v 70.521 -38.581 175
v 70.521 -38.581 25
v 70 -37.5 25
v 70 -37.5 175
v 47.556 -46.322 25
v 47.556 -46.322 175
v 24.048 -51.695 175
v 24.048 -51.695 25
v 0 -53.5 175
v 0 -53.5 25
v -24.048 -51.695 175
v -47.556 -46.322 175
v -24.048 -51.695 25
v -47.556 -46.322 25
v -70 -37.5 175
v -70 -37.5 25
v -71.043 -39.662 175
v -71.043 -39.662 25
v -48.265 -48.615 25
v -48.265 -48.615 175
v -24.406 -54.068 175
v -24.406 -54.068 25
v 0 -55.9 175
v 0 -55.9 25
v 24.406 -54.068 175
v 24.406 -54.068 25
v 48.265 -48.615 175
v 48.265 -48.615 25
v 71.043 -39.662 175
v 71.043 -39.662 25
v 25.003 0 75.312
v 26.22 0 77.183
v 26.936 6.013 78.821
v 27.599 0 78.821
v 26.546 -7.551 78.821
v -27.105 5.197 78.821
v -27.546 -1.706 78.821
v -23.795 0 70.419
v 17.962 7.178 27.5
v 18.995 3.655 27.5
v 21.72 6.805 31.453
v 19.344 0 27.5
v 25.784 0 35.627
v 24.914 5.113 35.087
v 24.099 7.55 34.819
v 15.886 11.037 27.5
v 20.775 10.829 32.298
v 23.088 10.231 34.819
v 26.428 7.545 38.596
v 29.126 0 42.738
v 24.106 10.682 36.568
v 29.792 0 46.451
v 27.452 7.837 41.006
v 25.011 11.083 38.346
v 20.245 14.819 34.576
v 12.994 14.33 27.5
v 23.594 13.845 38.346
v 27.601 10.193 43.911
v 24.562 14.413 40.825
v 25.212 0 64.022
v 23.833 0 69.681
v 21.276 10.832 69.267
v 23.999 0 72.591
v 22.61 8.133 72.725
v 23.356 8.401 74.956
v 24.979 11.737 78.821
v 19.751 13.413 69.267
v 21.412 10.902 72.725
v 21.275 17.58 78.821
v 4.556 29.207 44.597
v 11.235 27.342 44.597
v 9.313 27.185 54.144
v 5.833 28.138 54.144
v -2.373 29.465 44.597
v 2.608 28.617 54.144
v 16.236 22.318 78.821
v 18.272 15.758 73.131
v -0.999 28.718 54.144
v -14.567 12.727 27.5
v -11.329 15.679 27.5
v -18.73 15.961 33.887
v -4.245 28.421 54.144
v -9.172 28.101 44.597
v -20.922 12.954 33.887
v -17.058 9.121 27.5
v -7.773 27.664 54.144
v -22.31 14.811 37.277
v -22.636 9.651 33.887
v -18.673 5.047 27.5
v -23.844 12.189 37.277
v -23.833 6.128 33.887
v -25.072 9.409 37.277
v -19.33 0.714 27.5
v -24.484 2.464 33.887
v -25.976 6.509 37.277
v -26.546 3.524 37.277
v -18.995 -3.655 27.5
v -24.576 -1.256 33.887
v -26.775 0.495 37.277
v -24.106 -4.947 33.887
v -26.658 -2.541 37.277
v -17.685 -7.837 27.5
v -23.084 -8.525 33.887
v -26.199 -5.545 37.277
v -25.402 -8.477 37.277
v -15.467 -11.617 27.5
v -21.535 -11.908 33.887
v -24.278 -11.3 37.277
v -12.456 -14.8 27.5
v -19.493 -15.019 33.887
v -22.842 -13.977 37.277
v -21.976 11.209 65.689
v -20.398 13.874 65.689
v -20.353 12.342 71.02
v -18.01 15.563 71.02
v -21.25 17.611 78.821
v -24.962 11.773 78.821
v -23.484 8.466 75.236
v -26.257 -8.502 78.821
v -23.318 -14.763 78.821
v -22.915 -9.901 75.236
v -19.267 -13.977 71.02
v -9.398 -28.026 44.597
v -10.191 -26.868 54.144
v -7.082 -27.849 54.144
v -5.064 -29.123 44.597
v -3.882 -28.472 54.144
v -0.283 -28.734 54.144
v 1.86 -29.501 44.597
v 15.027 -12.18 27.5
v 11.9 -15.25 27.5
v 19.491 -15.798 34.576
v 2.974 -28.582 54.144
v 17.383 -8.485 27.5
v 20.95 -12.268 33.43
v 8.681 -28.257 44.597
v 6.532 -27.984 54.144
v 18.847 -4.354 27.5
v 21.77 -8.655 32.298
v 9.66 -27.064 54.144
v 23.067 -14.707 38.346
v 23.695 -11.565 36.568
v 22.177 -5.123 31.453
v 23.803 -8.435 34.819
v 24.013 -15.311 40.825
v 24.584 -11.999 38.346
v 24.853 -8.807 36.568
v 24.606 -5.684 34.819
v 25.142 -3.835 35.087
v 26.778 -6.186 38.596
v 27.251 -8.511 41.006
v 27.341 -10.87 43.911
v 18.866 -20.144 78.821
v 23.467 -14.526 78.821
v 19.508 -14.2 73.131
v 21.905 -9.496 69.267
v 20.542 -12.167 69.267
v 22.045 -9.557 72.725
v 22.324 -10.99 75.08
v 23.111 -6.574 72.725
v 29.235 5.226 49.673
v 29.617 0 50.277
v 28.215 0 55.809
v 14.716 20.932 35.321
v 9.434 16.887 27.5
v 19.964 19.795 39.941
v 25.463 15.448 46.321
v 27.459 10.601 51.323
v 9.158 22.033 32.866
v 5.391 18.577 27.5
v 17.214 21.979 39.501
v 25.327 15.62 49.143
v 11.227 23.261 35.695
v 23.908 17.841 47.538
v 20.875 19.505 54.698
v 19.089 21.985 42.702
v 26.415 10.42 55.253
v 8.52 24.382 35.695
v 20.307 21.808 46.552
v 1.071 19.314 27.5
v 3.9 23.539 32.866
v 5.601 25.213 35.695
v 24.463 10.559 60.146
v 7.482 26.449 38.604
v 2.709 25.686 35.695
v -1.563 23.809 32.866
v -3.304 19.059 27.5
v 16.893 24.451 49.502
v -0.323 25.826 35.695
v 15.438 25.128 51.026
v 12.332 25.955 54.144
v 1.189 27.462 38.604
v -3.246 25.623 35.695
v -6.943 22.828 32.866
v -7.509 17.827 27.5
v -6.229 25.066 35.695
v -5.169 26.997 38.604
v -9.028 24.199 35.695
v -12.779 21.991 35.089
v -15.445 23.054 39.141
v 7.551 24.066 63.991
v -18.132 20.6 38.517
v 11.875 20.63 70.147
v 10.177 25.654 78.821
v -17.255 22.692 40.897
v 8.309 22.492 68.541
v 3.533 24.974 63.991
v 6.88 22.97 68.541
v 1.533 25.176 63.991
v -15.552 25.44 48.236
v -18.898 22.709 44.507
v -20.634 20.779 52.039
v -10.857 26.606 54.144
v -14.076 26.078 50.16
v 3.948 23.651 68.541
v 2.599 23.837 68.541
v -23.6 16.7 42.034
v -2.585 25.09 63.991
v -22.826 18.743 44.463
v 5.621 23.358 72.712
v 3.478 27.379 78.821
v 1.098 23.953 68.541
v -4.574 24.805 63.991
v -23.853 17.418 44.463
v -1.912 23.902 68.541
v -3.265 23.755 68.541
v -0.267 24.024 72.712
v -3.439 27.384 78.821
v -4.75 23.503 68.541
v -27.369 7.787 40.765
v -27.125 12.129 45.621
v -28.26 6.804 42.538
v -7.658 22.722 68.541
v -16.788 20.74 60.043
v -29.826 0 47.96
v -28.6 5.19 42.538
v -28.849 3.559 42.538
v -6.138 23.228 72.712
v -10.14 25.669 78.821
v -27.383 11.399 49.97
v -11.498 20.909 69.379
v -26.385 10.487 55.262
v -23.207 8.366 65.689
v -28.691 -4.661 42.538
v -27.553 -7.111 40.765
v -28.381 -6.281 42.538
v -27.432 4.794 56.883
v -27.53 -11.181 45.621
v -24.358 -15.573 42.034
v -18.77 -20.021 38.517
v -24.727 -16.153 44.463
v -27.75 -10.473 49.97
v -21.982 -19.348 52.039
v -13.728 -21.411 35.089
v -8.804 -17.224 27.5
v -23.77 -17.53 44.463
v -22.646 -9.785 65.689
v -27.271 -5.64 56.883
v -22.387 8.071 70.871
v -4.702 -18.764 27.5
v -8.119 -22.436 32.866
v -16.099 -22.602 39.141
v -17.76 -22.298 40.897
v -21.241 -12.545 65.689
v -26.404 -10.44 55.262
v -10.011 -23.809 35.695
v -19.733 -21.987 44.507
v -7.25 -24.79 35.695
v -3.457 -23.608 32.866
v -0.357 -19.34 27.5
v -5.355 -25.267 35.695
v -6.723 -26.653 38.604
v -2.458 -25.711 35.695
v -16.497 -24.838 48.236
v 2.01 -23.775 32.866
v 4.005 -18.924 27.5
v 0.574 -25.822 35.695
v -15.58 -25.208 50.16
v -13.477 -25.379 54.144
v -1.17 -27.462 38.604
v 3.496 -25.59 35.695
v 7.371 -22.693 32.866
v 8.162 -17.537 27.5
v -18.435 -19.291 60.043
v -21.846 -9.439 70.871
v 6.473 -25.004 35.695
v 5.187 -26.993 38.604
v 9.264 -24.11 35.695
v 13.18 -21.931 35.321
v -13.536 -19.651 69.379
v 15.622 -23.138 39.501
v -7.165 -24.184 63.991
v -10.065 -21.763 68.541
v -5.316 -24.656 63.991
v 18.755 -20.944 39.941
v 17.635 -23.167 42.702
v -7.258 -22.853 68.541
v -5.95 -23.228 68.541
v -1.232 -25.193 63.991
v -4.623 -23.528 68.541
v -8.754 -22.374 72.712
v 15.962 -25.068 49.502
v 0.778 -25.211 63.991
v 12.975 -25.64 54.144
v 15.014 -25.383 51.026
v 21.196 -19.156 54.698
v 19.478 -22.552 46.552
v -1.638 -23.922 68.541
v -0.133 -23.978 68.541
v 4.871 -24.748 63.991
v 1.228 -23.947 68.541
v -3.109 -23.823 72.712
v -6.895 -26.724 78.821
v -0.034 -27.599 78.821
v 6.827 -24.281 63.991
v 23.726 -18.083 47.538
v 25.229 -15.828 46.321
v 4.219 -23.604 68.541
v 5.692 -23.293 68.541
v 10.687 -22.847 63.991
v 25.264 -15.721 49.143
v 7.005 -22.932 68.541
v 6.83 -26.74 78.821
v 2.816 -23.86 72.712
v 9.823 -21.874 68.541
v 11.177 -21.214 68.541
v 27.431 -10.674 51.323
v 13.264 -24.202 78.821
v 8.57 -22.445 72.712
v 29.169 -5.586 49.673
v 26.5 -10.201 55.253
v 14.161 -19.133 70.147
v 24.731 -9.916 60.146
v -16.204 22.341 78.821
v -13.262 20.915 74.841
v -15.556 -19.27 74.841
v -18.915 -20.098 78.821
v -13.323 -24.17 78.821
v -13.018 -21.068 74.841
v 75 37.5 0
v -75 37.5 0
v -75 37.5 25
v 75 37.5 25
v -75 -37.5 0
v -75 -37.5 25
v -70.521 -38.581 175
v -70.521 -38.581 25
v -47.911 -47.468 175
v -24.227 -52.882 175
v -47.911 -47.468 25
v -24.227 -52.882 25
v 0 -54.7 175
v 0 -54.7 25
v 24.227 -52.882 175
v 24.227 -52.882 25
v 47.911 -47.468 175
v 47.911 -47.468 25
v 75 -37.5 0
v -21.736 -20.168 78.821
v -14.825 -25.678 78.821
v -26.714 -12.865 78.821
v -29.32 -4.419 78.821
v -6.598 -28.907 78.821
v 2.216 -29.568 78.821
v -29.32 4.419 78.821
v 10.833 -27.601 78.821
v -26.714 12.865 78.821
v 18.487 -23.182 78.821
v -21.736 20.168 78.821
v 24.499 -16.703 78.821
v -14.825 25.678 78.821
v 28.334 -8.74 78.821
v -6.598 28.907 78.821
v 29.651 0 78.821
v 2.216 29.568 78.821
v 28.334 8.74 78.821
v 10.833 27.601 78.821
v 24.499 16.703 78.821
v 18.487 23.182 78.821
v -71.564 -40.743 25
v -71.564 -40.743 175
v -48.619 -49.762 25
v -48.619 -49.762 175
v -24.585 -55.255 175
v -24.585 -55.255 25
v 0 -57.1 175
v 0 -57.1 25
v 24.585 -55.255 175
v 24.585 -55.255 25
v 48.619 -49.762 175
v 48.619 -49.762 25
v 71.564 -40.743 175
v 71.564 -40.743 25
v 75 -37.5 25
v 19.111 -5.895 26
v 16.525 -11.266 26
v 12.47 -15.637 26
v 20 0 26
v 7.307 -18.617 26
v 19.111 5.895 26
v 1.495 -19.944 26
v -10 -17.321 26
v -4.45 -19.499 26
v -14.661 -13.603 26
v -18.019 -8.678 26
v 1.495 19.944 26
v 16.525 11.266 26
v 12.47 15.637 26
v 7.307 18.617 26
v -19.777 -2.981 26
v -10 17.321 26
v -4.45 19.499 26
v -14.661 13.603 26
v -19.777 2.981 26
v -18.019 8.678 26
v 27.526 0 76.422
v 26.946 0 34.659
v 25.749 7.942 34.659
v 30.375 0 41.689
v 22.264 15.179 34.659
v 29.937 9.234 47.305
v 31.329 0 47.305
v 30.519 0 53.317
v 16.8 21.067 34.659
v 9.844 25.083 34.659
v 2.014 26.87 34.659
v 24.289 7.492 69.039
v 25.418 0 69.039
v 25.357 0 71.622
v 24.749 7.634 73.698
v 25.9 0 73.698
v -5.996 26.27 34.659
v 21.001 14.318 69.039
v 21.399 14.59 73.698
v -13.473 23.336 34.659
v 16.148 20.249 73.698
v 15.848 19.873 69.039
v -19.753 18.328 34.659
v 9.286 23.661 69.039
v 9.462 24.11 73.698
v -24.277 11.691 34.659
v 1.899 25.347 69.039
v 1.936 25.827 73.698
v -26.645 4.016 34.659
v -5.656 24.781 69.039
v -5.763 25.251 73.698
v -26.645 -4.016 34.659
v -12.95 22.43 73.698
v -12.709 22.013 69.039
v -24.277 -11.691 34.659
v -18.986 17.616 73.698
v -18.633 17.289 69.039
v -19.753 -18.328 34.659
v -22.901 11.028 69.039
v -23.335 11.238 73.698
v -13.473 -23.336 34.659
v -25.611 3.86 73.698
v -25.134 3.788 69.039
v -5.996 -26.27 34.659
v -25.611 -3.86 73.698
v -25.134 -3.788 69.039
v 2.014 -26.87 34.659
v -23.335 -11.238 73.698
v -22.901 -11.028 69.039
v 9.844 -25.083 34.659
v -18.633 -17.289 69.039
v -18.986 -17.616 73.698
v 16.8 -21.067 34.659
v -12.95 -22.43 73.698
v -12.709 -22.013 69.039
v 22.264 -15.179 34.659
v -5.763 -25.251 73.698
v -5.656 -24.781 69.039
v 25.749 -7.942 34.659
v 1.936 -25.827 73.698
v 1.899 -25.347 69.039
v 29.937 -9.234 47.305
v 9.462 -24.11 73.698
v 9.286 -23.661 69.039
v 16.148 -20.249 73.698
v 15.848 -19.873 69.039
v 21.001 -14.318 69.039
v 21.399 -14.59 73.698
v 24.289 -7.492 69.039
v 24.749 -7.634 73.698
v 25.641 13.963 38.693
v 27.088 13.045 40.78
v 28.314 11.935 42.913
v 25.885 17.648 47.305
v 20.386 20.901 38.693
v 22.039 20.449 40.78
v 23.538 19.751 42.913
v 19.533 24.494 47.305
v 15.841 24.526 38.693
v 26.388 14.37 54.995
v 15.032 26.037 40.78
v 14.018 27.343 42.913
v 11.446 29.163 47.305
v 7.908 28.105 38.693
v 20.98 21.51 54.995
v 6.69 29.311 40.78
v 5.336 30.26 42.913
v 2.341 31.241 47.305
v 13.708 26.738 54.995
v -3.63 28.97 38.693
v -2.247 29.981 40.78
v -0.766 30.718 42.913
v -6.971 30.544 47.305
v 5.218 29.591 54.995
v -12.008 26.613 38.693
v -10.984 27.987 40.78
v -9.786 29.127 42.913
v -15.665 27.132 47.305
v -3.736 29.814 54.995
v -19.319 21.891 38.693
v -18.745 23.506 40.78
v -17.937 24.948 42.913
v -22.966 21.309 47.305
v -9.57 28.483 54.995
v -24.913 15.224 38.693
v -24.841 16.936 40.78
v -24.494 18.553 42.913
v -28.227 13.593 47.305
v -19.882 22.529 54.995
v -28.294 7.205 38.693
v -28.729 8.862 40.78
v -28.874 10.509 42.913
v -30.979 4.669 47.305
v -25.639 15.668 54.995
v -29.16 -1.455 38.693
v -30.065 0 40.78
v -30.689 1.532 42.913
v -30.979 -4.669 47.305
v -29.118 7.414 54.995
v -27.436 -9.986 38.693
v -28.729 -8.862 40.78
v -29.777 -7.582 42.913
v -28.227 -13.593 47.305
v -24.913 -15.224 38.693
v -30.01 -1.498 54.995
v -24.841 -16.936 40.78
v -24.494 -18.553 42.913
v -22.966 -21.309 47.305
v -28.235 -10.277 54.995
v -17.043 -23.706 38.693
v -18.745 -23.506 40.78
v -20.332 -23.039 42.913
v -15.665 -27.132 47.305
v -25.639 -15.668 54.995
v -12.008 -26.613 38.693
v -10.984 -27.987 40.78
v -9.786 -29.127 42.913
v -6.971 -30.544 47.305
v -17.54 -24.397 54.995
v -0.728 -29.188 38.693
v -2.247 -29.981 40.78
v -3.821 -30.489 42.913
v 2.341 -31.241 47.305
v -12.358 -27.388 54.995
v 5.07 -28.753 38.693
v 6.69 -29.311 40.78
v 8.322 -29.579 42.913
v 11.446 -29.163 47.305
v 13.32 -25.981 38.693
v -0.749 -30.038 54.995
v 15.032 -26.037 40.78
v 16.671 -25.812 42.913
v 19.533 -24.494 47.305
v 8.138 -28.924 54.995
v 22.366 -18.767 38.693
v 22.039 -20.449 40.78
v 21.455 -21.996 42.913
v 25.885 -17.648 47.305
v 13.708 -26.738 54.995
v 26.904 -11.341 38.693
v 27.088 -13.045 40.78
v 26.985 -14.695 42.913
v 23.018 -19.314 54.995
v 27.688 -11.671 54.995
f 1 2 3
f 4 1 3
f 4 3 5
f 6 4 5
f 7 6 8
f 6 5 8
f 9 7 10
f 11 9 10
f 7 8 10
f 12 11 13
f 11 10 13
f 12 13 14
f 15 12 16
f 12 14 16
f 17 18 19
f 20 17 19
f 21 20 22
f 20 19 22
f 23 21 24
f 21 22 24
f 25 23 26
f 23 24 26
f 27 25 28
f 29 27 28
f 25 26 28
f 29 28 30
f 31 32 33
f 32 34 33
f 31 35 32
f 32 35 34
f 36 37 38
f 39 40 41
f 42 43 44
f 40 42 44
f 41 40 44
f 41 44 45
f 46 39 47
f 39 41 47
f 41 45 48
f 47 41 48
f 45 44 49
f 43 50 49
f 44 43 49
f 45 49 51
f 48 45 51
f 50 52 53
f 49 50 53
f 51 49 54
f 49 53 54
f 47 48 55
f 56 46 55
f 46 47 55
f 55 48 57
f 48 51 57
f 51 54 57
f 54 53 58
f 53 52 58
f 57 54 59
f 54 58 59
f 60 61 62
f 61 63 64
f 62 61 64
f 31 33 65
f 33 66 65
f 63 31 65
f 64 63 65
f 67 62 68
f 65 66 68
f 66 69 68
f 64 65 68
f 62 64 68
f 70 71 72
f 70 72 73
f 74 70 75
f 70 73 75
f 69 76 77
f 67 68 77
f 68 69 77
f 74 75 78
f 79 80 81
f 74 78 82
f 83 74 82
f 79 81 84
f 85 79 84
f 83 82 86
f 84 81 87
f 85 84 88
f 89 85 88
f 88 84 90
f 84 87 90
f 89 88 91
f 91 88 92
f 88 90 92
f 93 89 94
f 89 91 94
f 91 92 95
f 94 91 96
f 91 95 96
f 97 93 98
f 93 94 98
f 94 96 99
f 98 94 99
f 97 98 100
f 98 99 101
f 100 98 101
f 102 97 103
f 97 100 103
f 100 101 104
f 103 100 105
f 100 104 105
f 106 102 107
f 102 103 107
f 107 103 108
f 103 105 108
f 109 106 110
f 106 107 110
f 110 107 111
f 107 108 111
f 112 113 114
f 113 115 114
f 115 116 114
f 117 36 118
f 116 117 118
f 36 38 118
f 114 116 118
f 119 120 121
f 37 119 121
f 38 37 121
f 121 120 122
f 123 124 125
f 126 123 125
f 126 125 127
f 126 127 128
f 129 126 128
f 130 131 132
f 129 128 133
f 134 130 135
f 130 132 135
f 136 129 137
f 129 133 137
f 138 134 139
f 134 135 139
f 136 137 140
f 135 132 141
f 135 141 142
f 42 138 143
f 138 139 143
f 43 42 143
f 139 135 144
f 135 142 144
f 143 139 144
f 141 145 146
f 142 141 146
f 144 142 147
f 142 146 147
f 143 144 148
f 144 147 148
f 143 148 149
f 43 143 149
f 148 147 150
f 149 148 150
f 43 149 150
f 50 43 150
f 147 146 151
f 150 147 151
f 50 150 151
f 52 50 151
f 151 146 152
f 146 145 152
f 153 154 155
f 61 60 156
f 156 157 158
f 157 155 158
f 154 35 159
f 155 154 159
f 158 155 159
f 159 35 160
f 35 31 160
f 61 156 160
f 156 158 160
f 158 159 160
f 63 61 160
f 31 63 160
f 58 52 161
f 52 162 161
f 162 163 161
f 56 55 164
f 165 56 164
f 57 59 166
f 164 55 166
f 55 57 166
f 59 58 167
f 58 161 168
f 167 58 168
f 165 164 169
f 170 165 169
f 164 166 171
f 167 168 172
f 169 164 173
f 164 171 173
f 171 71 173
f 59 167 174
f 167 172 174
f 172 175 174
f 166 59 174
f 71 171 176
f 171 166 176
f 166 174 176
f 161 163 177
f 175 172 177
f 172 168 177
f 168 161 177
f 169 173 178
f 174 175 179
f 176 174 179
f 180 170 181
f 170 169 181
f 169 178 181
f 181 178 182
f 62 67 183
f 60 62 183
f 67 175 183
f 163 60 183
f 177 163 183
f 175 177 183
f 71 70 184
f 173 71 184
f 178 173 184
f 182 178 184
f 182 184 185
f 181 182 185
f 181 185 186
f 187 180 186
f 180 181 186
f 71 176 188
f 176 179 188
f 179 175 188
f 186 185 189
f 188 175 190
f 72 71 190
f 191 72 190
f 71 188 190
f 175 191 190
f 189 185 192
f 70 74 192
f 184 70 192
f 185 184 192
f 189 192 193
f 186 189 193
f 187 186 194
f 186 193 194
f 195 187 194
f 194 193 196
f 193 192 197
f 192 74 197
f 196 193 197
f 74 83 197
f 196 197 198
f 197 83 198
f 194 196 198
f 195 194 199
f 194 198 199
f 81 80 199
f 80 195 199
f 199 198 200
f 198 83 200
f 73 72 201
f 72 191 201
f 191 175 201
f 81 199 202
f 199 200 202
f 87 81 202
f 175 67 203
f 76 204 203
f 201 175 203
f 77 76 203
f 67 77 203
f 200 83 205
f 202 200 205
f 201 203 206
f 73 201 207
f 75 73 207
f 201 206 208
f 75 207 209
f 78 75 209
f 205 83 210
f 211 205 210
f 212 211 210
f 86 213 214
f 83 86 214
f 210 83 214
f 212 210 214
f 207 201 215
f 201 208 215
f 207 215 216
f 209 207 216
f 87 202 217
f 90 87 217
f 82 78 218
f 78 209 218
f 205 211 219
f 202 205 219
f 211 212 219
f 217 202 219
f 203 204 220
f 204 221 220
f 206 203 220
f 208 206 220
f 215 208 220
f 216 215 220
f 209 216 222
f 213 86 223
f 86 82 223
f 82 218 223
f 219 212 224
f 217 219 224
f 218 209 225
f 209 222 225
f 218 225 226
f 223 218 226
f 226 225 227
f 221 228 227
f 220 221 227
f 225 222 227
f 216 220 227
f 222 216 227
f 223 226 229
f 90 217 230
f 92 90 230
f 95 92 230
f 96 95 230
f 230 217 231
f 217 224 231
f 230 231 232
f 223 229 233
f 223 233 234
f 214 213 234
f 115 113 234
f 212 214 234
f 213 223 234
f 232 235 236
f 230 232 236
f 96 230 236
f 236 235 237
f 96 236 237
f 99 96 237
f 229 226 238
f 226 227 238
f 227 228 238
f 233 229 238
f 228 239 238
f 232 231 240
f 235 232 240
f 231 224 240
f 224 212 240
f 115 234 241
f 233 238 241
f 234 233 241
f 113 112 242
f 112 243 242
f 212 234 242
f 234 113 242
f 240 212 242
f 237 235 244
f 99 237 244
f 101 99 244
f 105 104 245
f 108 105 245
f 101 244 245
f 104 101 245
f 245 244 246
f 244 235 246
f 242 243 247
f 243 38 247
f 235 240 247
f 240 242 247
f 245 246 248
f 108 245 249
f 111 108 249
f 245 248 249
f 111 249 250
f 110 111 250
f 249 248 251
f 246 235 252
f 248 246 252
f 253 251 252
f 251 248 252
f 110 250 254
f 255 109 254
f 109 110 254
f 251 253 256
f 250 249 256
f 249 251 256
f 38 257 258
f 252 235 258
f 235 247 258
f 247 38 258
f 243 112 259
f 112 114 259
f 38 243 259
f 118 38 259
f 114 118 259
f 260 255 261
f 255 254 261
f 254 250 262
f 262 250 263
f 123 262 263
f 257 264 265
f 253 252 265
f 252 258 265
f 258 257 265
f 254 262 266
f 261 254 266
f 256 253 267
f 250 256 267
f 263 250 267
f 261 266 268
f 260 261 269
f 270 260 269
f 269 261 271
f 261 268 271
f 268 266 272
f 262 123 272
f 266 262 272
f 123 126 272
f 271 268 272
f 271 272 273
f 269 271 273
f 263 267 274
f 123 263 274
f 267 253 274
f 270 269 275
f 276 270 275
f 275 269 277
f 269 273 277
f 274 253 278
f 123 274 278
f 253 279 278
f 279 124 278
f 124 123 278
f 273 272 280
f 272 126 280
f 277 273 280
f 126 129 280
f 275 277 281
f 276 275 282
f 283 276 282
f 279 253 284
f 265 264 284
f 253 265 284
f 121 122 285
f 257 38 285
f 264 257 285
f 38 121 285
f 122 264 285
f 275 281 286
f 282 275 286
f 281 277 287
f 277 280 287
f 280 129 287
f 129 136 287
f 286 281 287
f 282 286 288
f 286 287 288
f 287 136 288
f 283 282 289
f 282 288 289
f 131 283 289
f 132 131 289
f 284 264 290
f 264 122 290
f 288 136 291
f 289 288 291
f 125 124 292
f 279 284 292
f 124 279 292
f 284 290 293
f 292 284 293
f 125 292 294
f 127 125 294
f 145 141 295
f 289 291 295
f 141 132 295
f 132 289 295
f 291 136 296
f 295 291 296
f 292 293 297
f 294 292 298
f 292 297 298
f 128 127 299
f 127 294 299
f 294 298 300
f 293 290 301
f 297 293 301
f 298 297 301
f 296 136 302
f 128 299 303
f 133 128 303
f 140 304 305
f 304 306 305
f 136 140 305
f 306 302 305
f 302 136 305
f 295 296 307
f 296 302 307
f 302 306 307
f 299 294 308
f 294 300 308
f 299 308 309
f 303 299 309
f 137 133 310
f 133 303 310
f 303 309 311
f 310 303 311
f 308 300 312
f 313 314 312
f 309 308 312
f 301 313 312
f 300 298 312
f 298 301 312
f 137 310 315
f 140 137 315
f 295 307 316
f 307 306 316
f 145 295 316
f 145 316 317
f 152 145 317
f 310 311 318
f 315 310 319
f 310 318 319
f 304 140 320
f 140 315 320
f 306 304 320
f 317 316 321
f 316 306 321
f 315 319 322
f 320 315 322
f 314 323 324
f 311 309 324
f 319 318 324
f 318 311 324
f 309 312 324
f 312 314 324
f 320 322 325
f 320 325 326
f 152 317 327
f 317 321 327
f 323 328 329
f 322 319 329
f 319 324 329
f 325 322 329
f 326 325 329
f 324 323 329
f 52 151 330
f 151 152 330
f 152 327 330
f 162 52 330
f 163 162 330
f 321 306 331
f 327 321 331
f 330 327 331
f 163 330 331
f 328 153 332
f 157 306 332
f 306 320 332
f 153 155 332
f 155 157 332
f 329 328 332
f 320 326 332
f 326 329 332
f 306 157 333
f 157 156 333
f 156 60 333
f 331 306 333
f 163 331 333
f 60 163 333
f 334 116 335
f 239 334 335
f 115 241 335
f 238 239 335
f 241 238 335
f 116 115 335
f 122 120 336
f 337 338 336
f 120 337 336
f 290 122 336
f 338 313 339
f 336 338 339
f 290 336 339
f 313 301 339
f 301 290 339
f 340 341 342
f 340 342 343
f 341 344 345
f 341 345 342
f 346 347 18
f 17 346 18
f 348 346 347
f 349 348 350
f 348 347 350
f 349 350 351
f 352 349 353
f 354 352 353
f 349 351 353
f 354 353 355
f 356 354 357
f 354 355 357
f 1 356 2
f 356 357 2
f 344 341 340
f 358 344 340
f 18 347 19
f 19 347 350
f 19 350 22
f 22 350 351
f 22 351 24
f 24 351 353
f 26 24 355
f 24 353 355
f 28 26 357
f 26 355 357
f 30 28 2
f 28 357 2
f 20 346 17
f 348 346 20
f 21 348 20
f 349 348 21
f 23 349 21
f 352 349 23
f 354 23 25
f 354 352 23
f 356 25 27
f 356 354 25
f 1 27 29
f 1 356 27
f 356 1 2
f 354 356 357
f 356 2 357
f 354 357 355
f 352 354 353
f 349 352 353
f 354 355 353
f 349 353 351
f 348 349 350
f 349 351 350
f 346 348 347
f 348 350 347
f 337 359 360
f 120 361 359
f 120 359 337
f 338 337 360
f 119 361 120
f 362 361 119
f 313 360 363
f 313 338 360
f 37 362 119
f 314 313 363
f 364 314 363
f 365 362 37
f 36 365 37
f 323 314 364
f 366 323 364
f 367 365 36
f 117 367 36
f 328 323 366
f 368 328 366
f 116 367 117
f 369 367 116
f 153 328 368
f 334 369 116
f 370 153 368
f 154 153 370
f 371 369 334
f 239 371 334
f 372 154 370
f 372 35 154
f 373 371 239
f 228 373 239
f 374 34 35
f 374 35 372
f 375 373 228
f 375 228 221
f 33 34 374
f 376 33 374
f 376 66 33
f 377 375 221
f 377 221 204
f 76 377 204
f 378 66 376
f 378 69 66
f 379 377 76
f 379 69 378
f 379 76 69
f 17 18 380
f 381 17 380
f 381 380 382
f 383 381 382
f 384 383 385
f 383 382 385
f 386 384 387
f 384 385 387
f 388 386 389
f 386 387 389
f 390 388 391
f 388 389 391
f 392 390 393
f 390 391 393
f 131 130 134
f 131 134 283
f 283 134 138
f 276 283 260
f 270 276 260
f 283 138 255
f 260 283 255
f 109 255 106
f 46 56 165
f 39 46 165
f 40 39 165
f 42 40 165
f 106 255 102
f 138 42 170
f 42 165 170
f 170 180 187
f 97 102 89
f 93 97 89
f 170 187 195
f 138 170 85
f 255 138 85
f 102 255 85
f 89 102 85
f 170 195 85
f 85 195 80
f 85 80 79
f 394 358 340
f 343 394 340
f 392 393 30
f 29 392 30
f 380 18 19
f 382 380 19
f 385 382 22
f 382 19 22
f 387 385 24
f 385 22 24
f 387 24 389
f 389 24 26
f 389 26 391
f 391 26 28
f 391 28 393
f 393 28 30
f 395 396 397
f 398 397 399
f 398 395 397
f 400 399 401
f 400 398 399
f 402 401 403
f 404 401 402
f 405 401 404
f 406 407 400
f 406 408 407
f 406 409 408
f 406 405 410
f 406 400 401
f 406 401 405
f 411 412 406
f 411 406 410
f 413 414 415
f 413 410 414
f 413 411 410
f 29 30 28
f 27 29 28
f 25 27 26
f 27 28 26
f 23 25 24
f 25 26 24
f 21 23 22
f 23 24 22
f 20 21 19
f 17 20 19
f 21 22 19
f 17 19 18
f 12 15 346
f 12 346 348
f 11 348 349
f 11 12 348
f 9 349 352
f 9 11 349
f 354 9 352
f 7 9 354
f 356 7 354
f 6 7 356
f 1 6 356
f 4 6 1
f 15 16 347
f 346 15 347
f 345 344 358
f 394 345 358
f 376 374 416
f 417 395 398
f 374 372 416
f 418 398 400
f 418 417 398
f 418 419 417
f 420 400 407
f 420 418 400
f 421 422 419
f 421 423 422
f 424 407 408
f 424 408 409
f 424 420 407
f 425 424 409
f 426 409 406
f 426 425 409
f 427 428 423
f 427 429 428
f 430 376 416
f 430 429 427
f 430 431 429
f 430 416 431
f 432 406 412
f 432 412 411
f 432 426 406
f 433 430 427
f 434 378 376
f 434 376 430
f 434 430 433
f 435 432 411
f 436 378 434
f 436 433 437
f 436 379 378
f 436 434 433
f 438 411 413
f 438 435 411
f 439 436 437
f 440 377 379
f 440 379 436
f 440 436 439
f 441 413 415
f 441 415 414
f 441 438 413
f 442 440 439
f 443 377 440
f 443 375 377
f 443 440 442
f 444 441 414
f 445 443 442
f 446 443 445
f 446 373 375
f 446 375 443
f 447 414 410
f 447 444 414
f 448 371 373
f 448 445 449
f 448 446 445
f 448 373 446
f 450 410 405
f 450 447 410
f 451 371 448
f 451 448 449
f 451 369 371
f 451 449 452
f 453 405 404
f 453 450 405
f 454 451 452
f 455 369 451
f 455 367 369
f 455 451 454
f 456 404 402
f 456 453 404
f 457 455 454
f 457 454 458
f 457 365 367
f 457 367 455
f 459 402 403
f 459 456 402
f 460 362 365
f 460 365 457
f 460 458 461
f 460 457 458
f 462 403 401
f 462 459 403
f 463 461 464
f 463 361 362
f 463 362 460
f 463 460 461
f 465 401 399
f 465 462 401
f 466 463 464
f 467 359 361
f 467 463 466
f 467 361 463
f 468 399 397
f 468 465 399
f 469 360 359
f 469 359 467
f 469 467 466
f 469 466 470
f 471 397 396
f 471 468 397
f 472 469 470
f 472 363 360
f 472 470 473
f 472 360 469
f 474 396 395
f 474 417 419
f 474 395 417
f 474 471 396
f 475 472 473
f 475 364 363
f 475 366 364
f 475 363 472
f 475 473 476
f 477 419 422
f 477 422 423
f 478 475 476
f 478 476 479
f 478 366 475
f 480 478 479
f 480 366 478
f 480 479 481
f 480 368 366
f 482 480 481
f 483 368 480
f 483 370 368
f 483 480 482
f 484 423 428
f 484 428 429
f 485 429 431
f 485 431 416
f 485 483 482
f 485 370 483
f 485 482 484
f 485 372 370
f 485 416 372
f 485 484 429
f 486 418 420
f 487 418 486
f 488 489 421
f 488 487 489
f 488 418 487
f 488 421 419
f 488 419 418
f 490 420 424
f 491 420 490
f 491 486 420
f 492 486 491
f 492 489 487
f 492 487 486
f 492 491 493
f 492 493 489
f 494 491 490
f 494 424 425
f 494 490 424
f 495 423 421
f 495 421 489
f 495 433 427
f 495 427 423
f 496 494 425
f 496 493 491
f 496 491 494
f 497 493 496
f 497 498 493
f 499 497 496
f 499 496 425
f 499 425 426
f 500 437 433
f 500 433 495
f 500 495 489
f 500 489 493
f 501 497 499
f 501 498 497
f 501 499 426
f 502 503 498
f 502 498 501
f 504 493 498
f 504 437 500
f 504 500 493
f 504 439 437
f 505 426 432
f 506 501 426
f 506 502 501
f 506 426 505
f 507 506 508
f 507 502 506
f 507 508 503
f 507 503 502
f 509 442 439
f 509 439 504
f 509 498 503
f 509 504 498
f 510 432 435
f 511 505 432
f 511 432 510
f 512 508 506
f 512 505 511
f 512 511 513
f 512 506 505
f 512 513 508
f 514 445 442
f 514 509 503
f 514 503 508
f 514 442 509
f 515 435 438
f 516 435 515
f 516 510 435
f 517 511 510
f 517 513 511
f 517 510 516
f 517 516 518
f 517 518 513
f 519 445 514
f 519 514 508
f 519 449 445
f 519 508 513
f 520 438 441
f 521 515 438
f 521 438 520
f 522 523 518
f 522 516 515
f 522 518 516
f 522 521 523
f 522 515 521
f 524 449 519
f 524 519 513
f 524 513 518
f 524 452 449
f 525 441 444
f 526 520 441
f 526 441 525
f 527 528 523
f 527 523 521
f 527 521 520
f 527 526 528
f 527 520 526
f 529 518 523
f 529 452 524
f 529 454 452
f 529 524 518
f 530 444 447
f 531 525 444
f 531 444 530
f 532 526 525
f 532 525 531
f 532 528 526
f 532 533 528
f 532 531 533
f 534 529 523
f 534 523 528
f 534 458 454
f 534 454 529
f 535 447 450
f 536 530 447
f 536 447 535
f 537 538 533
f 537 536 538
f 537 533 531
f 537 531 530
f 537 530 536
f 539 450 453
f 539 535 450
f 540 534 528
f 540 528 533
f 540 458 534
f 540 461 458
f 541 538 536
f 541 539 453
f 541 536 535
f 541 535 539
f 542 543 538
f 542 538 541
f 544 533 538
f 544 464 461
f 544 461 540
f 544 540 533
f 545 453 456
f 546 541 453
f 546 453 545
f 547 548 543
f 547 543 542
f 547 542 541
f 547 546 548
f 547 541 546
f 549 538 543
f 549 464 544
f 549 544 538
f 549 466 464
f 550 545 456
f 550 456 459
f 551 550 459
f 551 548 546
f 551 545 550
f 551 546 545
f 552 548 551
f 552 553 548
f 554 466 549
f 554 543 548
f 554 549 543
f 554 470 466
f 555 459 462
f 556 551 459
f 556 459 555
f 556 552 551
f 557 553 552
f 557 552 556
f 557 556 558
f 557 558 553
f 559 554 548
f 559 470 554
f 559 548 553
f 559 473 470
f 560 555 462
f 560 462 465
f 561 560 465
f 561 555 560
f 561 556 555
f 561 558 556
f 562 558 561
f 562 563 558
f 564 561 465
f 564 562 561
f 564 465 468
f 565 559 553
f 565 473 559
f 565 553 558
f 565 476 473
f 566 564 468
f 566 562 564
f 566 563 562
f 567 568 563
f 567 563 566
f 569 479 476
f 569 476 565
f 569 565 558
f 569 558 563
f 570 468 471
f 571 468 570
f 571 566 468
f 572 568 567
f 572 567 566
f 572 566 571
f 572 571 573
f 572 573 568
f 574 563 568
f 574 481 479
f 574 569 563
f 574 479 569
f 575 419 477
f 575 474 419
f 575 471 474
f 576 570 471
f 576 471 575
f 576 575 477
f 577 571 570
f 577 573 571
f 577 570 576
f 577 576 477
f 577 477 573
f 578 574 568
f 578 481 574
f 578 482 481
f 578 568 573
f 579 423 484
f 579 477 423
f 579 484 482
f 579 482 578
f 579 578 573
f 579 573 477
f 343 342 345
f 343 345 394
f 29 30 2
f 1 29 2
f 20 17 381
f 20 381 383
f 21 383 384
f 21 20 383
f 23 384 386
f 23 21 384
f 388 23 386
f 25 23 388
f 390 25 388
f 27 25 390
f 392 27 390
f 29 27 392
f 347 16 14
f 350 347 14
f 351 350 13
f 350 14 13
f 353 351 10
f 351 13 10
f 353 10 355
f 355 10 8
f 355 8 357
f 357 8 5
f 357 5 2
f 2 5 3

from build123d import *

# Parameters (mm, degrees)
F0_W     = 150
F0_H     = 75
F1_DEPTH = 25
F3_DEPTH = 150
F5_DEPTH = 150
F7_DEPTH = 150
F10_T    = -1.5


with BuildPart() as f1:
    # F0 (on Top) → F1 (new body)
    with BuildSketch(Plane.XY):
        Rectangle(F0_W, F0_H)
    extrude(amount=F1_DEPTH)


with BuildPart() as f3:
    # F2 (on face) → F3 (new body)
    with BuildSketch(Plane.XY.offset(25)):
        with BuildLine():
            ThreePointArc((70, -37.5), (0, -53.5), (-70, -37.5))
            Line((-70, -37.5), (-70.5213343677, -38.5808378588))
            ThreePointArc((-70.5213343677, -38.5808378588), (0, -54.7), (70.5213343677, -38.5808378588))
            Line((70.5213343677, -38.5808378588), (70, -37.5))
        make_face()
    extrude(amount=F3_DEPTH)


with BuildPart() as f5:
    # F4 (on face) → F5 (new body)
    with BuildSketch(Plane.XY.offset(25)):
        with BuildLine():
            ThreePointArc((70.5213343677, -38.5808378588), (0, -54.7), (-70.5213343677, -38.5808378588))
            Line((-70.5213343677, -38.5808378588), (-71.0426687355, -39.6616757176))
            ThreePointArc((-71.0426687355, -39.6616757176), (0, -55.9), (71.0426687355, -39.6616757176))
            Line((71.0426687355, -39.6616757176), (70.5213343677, -38.5808378588))
        make_face()
    extrude(amount=F5_DEPTH)


with BuildPart() as f7:
    # F6 (on face) → F7 (new body)
    with BuildSketch(Plane.XY.offset(25)):
        with BuildLine():
            ThreePointArc((71.0426687355, -39.6616757176), (0, -55.9), (-71.0426687355, -39.6616757176))
            Line((-71.0426687355, -39.6616757176), (-71.5640031032, -40.7425135764))
            ThreePointArc((-71.5640031032, -40.7425135764), (0, -57.1), (71.5640031032, -40.7425135764))
            Line((71.5640031032, -40.7425135764), (71.0426687355, -39.6616757176))
        make_face()
    extrude(amount=F7_DEPTH)


with BuildPart() as f9:
    # F8 (on Front) → F9 (revolve)
    with BuildSketch(Plane.XZ):
        with BuildLine():
            Line((0, 78.8208022714), (0, 26))
            Line((0, 26), (20, 26))
            add(Edge.make_bspline(
                [(20, 26), (25.8251146772, 32.2698097017), (37.052360313, 46.9885975137), (21.7360878614, 70.29013323), (27.4611583794, 76.5103562412), (29.650805518, 78.8208022714)],
                knots=[0, 0, 0, 0, 0.3865496862, 0.7612191828, 1, 1, 1, 1], degree=3))
            Line((29.650805518, 78.8208022714), (0, 78.8208022714))
        make_face()
    revolve(axis=Axis((0, 0, 86.6440743882), (0, 0, 1)))

    # F10
    f10_openings = [f9.faces().sort_by_distance(p)[0] for p in [
        (0, 0, 78.820802),
    ]]
    offset(amount=F10_T, openings=f10_openings)


solid = Compound([f1.part, f3.part, f5.part, f7.part, f9.part])
